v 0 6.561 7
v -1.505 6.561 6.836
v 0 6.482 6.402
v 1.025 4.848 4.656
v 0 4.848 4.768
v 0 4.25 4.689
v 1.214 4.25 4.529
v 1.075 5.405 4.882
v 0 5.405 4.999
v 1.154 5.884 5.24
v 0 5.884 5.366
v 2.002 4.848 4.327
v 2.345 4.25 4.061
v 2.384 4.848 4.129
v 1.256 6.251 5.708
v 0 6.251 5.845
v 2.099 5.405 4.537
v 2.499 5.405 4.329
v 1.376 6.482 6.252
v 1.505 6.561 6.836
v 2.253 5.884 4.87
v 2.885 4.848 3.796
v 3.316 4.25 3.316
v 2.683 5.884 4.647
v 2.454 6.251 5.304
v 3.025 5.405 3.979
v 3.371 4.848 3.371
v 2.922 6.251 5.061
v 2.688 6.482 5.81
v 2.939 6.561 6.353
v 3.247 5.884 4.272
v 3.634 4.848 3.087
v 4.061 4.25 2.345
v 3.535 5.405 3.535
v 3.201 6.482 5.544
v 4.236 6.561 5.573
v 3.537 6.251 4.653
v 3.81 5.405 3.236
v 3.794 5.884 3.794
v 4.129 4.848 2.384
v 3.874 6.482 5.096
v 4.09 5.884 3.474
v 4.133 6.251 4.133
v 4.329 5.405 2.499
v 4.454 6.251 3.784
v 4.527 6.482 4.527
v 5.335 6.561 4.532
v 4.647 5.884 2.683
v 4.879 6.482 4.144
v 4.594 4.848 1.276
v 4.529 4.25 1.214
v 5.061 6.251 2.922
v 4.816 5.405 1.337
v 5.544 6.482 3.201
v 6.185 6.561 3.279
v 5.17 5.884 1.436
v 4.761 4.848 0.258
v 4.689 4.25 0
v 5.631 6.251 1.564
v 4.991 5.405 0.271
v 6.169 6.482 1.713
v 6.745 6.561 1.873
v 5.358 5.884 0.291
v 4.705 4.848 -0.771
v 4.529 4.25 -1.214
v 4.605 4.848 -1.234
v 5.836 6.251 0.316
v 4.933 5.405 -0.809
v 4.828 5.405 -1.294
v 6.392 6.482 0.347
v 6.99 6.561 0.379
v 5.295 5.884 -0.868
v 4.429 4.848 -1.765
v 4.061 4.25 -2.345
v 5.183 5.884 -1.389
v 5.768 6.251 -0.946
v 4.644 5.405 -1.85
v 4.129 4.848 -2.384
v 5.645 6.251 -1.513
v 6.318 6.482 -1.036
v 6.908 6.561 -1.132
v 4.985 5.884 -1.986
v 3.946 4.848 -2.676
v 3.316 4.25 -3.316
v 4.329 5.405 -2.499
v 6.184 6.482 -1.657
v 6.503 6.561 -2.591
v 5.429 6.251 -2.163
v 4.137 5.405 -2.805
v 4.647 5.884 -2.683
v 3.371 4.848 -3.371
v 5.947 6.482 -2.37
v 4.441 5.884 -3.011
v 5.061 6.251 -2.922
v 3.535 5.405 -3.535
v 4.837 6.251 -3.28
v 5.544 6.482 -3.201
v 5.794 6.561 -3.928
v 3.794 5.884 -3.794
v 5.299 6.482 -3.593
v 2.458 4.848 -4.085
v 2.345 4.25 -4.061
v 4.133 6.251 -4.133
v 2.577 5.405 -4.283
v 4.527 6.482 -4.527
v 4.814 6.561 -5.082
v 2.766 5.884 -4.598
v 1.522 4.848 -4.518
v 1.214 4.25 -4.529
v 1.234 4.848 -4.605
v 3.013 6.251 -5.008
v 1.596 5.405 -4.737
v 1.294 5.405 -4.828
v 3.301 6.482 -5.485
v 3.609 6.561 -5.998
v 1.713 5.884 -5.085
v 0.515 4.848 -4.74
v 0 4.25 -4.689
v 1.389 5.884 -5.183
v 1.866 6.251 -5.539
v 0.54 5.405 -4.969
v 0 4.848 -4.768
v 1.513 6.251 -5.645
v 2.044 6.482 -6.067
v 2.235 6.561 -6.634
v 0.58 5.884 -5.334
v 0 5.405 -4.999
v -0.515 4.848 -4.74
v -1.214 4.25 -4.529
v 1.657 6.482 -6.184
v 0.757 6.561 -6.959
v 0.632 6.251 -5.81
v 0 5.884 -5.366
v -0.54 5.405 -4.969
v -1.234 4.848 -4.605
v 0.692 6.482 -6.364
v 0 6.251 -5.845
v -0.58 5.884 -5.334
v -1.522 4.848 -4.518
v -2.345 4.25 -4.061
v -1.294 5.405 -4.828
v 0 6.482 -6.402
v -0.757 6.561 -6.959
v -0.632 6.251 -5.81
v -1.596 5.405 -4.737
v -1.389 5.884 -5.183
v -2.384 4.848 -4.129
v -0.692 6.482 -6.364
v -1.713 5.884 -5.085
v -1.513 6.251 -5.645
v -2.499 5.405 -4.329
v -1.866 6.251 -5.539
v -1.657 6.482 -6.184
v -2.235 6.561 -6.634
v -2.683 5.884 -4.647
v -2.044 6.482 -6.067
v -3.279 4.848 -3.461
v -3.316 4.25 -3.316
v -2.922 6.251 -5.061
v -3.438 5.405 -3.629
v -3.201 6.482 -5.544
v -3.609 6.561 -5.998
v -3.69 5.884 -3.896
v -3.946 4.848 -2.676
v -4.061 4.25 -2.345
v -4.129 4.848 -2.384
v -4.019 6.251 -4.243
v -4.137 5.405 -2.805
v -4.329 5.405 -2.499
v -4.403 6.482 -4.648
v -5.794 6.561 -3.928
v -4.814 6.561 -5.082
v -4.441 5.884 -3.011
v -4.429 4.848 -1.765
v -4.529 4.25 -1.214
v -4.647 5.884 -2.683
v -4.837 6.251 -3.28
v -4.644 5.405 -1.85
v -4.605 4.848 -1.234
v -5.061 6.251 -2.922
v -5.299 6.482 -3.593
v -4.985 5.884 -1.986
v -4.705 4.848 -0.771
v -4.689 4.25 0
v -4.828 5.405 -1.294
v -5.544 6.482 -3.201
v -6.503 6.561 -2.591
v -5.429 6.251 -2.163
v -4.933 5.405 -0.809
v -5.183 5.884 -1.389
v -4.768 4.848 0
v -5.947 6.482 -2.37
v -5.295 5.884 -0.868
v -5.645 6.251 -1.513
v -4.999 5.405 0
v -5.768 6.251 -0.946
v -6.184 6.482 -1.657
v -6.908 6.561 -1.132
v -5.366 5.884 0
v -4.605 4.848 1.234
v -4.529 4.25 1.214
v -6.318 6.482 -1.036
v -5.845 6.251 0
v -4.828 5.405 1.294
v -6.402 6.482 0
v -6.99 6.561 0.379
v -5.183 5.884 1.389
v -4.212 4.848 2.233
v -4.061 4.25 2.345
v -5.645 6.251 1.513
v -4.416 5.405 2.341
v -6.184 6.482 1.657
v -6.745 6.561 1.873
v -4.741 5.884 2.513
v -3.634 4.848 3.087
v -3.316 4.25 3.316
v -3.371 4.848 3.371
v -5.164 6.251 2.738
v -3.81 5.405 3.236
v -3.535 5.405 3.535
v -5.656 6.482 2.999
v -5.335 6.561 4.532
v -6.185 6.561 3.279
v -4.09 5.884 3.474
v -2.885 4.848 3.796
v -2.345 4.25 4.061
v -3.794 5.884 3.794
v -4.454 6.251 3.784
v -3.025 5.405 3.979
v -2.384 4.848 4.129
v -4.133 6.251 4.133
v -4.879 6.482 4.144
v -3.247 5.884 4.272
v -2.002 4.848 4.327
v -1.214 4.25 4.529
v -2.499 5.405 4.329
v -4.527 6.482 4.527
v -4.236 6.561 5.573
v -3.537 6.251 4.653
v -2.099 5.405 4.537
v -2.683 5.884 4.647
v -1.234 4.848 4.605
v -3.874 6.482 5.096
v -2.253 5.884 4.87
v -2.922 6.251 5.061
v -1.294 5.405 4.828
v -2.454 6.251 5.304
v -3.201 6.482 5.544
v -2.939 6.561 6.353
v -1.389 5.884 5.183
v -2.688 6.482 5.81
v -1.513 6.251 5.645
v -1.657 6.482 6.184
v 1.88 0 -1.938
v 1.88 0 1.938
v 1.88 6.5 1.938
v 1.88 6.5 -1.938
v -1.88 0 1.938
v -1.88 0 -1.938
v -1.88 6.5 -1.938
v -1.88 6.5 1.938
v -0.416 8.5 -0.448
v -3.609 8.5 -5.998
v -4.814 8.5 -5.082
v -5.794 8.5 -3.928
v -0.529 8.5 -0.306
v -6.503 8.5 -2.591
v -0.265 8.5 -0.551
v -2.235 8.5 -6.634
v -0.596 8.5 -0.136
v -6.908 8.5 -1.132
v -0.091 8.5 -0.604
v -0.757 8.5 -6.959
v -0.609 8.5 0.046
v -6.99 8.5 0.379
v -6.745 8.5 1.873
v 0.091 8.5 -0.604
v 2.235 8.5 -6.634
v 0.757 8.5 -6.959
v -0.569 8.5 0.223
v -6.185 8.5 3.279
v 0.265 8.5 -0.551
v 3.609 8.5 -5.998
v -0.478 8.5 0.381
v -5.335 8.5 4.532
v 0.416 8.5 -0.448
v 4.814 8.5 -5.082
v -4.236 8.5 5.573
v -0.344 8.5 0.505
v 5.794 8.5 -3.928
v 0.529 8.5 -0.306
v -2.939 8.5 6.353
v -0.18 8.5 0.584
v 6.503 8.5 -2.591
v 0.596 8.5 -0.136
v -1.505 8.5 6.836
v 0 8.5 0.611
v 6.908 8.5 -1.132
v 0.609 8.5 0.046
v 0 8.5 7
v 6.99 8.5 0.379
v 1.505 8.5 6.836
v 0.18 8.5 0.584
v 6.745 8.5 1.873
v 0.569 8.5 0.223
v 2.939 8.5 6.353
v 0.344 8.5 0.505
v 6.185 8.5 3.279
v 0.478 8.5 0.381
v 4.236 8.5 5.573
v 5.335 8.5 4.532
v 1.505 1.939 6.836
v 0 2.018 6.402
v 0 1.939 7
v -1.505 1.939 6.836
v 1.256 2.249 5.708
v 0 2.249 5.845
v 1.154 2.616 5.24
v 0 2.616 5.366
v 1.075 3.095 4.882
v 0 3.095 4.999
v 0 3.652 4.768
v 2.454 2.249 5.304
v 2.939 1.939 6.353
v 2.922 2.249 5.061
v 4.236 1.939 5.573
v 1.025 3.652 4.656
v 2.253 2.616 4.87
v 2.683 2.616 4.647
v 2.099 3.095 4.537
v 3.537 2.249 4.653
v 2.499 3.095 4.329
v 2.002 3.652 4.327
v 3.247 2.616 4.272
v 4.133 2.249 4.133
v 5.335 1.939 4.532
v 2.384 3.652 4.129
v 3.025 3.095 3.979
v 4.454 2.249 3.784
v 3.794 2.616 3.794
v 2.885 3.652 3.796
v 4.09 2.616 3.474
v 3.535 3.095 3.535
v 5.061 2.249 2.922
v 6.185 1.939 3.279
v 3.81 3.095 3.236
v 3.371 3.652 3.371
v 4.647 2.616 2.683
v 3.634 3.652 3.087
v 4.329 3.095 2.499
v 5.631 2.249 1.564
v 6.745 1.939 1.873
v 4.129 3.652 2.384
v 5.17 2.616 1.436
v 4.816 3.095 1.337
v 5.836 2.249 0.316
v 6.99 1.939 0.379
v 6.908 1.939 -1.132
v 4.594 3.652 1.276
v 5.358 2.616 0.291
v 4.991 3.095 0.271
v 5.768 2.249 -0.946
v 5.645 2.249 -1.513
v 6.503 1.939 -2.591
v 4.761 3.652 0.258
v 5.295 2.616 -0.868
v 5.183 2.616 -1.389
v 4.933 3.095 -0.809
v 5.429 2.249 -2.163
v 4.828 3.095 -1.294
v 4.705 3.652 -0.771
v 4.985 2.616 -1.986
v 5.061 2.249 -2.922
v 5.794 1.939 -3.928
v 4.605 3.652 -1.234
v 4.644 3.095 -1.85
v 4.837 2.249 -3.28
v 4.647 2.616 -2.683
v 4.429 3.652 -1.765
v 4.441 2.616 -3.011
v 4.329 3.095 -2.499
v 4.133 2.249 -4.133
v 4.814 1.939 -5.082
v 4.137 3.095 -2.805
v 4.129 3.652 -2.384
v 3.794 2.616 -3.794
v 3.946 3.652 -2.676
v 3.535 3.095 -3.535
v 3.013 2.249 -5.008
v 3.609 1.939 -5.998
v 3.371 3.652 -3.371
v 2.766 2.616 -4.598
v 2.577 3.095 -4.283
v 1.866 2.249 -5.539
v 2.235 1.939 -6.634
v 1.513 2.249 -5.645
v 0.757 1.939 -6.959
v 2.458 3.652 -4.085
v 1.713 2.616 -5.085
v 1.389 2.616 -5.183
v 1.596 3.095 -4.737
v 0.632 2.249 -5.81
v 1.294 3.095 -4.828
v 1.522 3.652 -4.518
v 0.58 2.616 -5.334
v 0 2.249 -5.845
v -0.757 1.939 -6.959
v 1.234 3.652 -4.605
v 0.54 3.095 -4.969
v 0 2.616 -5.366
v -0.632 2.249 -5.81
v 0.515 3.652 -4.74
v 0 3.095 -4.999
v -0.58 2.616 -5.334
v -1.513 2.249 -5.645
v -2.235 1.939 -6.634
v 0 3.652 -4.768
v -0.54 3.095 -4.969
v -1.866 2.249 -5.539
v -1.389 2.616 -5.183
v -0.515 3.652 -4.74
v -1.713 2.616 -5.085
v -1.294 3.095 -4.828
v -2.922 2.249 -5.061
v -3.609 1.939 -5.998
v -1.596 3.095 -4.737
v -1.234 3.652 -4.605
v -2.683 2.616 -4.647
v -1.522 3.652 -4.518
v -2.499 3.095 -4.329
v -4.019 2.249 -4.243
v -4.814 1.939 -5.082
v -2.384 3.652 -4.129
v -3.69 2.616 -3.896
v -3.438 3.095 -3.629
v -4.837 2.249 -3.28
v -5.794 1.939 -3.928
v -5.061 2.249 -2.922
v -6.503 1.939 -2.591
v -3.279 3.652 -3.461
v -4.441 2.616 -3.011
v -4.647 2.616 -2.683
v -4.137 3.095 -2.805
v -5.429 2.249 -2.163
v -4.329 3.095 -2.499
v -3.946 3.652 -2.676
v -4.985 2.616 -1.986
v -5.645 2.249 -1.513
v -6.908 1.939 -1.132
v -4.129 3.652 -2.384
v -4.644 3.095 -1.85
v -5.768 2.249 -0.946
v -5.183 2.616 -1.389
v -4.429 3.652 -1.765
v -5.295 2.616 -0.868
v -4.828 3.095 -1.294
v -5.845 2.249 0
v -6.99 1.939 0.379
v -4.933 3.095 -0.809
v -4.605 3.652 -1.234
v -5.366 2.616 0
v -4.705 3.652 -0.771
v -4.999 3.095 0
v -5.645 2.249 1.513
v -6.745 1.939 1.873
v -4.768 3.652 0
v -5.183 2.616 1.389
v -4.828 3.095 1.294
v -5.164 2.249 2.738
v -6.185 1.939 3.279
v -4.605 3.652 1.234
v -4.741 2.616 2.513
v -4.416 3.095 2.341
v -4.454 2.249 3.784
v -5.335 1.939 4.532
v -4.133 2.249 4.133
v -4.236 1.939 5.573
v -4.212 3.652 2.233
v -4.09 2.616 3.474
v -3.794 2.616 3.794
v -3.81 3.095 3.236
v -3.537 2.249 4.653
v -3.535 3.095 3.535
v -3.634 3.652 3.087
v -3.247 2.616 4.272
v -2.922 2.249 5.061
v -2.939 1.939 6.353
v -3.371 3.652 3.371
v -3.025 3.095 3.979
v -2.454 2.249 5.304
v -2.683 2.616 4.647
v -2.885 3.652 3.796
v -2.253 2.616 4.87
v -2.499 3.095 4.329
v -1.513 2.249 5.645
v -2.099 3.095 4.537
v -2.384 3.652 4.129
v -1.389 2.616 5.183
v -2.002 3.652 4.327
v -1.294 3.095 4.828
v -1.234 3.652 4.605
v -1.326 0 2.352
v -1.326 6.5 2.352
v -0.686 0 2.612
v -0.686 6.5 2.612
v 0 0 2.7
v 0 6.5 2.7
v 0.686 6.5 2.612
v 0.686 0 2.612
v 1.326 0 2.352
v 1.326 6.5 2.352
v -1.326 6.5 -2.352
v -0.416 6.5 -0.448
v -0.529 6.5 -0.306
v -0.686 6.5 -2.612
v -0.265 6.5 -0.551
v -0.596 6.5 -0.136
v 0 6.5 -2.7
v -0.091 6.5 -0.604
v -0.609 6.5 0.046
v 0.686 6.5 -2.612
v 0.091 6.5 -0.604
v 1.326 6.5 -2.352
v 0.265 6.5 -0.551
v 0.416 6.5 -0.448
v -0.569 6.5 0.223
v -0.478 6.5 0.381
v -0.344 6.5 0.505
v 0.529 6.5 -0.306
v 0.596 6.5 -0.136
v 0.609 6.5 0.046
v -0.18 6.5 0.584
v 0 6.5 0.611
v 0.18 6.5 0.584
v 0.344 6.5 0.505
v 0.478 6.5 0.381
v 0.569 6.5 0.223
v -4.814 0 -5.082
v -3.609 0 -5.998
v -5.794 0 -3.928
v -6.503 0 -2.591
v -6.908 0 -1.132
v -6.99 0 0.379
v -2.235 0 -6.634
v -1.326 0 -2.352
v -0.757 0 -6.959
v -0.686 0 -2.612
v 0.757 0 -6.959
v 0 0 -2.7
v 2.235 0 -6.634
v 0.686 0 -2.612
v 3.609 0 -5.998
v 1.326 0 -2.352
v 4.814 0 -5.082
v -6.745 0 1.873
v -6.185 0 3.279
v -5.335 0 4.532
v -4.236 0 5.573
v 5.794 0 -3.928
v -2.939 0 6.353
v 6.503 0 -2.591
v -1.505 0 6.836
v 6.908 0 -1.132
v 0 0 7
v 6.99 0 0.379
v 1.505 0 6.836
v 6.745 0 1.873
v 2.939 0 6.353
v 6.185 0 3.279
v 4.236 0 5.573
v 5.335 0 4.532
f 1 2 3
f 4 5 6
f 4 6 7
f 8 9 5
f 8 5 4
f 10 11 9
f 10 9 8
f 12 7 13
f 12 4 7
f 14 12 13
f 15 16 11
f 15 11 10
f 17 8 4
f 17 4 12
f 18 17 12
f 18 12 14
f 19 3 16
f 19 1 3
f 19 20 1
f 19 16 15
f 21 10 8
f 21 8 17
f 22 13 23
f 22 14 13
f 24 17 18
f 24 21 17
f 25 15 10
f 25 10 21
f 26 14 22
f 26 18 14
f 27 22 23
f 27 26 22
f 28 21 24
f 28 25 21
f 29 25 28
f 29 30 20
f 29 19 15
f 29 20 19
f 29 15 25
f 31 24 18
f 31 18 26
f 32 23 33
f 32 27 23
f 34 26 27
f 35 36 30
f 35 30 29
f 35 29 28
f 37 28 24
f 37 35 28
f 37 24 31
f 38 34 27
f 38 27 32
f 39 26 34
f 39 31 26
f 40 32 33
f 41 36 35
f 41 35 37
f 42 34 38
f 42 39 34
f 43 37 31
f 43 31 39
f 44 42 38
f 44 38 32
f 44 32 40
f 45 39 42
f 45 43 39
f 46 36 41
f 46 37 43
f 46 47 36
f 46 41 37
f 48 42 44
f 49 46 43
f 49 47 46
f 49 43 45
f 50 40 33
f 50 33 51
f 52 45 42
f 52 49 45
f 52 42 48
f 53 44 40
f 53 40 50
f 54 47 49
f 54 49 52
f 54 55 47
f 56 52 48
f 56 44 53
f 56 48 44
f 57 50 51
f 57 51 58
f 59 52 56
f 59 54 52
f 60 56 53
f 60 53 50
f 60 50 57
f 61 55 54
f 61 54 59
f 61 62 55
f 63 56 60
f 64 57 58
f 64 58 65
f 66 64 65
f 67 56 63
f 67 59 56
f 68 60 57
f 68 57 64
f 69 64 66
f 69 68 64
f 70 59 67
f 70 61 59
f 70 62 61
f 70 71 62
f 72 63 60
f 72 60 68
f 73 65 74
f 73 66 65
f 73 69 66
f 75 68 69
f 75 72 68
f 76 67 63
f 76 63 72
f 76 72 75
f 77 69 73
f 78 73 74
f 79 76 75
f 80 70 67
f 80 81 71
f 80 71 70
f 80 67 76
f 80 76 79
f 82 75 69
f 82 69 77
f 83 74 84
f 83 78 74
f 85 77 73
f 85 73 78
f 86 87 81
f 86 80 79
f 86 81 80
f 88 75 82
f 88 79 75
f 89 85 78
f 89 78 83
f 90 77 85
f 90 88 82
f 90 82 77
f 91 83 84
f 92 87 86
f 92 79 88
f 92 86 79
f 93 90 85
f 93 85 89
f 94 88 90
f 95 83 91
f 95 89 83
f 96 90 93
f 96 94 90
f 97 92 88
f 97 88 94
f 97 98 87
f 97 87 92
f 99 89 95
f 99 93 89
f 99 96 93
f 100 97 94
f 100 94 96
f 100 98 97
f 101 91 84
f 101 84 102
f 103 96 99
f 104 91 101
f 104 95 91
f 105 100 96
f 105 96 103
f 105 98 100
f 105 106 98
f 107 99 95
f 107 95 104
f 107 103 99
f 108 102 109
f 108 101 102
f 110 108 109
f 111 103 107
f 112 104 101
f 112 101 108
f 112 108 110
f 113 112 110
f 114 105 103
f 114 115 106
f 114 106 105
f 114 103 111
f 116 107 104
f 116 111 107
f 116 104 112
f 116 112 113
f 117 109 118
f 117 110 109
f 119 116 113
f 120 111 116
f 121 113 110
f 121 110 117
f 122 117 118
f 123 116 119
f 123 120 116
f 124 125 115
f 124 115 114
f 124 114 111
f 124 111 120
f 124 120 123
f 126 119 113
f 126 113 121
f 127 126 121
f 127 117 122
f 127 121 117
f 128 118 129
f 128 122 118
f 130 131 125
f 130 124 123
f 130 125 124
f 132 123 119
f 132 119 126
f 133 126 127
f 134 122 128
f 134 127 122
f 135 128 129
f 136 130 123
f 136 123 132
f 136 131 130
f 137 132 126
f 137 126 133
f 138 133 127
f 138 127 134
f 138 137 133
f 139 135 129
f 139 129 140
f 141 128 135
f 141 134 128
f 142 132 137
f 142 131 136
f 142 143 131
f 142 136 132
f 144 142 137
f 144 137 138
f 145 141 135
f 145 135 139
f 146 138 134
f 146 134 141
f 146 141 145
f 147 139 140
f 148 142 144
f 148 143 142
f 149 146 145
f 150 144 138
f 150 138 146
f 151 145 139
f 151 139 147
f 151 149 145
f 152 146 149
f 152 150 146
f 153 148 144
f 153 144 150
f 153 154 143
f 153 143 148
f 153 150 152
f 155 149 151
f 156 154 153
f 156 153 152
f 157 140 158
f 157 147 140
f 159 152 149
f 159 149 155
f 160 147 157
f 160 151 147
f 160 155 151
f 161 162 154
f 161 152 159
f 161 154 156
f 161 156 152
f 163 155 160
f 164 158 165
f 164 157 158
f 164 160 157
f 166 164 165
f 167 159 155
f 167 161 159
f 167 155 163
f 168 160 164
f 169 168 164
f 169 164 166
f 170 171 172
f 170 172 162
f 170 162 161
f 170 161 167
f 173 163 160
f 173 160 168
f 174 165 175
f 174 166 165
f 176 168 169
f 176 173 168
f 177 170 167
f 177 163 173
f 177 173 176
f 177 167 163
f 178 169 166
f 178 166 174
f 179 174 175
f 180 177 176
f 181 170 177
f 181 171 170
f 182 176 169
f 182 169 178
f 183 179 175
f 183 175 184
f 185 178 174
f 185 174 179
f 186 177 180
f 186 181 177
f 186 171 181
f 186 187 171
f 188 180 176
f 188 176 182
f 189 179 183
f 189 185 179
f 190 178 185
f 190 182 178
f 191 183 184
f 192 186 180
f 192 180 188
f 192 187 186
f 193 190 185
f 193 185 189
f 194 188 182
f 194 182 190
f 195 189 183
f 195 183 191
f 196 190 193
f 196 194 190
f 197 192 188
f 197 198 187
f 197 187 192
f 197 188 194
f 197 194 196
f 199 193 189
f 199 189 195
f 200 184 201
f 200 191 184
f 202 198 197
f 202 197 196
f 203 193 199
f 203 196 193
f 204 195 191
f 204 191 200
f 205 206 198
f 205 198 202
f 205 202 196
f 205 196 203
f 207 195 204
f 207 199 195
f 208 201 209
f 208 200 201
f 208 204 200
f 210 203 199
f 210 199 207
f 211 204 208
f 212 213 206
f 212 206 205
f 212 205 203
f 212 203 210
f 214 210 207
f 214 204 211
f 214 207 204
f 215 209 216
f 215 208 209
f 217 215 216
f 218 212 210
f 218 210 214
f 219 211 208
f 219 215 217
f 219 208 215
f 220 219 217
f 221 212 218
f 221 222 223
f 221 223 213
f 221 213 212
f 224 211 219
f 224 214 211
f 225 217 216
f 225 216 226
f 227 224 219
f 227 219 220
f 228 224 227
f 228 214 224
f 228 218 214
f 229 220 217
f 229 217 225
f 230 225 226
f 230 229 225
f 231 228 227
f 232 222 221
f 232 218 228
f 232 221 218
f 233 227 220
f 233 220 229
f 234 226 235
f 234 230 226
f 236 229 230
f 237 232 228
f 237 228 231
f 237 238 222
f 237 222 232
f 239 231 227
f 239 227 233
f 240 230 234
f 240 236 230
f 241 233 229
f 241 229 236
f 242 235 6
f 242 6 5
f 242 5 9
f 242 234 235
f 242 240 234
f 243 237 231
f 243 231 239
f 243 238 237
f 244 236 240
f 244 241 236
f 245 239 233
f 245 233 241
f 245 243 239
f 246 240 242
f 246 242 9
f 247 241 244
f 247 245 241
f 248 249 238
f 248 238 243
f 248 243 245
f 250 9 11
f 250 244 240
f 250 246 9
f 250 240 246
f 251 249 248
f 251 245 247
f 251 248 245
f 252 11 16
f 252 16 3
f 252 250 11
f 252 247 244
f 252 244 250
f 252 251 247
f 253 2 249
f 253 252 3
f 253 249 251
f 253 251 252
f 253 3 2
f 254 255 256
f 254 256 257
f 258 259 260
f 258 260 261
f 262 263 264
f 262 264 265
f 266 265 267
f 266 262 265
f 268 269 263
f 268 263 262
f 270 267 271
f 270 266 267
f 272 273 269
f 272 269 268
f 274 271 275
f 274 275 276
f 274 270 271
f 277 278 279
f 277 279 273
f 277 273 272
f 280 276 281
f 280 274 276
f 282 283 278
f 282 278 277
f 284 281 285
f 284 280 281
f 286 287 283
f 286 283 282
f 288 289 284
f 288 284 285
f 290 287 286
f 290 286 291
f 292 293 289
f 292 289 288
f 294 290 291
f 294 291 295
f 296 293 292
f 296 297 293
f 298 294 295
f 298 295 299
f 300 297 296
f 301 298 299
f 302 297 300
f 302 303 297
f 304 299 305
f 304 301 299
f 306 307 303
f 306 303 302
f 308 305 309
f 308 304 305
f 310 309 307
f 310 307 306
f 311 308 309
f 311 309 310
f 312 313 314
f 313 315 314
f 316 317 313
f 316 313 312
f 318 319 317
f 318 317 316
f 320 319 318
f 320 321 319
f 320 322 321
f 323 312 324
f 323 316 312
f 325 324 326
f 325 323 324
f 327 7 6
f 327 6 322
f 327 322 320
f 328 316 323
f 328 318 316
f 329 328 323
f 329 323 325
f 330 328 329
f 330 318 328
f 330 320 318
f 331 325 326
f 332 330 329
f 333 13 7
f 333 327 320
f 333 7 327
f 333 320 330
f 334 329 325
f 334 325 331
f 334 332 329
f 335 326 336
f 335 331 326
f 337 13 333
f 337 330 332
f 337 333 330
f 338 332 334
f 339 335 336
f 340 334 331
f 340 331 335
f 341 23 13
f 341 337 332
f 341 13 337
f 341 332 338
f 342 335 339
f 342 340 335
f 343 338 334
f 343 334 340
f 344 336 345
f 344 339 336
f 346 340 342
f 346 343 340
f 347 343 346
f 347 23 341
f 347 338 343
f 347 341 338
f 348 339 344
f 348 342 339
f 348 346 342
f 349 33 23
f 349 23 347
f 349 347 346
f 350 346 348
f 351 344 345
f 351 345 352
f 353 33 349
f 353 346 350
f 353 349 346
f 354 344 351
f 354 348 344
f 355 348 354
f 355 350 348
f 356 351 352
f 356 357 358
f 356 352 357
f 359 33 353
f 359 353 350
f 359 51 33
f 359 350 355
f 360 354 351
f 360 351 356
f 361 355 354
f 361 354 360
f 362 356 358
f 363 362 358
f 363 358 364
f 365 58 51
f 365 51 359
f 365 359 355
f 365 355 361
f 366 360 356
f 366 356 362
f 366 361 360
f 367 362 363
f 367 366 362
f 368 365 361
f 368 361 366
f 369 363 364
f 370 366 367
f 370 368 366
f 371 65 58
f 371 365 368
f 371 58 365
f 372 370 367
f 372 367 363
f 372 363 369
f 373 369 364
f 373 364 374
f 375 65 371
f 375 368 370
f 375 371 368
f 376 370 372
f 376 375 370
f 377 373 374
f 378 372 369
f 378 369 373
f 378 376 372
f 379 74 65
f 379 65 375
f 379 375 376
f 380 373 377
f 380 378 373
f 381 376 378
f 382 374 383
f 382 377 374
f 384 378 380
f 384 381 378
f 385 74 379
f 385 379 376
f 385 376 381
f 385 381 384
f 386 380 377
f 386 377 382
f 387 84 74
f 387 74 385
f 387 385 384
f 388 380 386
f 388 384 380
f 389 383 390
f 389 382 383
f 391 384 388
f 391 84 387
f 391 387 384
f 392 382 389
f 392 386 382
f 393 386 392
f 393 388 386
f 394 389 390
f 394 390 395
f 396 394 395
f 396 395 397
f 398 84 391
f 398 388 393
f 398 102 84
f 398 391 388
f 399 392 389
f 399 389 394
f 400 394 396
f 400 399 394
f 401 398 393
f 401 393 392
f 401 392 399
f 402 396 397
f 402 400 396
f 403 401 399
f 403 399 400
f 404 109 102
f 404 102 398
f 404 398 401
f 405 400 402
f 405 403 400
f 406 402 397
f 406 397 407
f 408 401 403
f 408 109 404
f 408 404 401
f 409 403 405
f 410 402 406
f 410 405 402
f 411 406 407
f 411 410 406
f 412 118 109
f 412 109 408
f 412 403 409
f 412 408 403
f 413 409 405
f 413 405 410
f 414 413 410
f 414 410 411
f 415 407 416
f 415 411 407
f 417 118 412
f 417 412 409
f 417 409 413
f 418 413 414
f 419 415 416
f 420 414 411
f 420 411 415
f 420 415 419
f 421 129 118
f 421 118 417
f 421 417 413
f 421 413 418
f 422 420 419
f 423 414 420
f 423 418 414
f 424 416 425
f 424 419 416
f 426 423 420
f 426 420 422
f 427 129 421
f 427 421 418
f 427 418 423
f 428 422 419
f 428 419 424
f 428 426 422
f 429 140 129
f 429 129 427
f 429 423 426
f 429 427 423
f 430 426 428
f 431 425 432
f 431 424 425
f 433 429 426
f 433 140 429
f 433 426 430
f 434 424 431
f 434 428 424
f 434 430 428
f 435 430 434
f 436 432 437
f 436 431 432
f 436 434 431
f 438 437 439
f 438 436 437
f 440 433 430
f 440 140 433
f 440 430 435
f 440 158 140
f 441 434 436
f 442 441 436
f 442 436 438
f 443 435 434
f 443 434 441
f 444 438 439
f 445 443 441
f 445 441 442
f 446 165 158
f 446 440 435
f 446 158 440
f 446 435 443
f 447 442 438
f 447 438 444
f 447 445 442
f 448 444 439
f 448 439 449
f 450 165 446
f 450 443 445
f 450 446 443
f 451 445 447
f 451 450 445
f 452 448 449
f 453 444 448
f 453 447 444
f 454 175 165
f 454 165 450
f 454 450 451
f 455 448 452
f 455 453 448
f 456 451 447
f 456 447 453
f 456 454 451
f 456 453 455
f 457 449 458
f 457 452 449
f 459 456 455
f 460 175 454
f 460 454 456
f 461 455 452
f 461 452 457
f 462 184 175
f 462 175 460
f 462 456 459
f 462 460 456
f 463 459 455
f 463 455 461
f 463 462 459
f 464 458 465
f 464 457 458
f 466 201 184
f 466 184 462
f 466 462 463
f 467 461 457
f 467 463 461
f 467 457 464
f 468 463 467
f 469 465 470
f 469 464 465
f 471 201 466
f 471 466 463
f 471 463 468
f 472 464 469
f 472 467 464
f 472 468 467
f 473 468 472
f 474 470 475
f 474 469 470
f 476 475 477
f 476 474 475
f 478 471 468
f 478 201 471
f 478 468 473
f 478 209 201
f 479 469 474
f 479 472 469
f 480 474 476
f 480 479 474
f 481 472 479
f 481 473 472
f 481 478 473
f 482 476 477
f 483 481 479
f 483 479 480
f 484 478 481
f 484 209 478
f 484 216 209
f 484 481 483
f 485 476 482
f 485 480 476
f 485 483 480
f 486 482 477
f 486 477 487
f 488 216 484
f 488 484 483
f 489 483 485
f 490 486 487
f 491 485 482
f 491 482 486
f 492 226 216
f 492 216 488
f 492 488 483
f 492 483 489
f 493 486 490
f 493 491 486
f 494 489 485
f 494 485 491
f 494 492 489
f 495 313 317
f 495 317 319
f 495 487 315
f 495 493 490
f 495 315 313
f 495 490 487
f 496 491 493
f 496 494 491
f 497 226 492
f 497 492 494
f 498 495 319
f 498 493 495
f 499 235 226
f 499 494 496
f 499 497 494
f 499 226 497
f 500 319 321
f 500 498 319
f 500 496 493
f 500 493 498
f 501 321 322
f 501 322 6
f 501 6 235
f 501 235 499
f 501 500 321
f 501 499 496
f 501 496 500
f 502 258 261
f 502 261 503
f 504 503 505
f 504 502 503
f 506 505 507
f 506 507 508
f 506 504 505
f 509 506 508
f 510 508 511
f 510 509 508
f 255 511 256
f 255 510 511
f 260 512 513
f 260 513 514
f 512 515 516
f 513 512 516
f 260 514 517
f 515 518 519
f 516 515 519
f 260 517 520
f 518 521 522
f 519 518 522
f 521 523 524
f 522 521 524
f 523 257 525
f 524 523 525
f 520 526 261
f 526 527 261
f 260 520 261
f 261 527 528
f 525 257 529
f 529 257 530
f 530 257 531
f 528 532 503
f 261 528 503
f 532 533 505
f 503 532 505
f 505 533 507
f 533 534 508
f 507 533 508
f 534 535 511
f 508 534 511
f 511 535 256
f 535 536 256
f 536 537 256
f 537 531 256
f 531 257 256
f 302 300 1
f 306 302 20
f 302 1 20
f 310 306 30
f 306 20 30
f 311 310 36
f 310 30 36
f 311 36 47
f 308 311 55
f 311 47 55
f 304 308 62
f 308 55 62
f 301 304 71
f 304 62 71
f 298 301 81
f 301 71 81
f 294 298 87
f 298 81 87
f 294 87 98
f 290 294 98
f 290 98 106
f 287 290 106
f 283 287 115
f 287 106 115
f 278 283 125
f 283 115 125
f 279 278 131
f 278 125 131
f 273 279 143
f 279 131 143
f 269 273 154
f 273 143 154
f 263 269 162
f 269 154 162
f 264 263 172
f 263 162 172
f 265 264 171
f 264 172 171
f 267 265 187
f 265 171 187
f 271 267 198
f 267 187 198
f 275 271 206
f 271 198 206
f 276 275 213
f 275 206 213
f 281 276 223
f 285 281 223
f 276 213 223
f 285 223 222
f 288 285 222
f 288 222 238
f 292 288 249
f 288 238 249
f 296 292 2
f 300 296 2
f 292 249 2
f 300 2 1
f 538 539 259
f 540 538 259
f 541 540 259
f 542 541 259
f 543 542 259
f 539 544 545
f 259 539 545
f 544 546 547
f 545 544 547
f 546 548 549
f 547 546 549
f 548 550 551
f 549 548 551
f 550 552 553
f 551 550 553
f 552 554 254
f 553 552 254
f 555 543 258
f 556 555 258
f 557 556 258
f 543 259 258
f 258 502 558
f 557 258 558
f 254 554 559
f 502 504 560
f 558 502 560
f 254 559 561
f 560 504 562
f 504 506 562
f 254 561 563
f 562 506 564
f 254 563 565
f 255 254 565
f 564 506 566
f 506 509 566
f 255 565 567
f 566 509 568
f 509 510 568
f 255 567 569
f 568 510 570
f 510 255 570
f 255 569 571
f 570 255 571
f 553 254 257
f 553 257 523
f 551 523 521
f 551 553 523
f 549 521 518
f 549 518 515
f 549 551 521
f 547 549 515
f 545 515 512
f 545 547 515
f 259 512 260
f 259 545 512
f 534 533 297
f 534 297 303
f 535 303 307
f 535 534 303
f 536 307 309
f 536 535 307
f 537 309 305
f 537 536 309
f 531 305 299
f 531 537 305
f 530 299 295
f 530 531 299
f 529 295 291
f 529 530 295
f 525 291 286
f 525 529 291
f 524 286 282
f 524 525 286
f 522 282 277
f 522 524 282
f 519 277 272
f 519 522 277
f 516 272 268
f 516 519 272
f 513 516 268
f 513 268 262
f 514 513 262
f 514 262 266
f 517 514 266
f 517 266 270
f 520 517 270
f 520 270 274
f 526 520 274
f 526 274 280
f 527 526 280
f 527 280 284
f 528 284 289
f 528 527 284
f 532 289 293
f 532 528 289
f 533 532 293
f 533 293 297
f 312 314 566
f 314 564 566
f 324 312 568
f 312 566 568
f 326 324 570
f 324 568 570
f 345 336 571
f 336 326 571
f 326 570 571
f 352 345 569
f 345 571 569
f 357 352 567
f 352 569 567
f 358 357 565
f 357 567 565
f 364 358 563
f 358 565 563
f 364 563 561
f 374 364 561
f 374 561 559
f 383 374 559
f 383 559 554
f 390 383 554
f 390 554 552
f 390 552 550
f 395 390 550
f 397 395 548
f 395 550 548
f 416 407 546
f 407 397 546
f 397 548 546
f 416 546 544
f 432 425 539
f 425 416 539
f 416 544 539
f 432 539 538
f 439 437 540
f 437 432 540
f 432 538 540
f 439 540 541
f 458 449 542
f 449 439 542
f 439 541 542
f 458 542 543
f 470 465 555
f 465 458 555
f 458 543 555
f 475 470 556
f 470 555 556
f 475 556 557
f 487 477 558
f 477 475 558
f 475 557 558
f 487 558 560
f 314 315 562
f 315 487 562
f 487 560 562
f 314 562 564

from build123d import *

# Parameters (mm, degrees)
SKETCH1_R           = 7
BOSS_EXTRUDE1_DEPTH = 6.5
SKETCH2_R           = 7
SKETCH2_R_2         = 0.611197666
BOSS_EXTRUDE2_DEPTH = 2
SKETCH3_R           = 2.310970428


with BuildPart() as part:
    # Sketch1 → Boss-Extrude1 (new body)
    with BuildSketch(Plane(origin=(0, 0, 0), x_dir=(1, 0, 0), z_dir=(0, 1, 0))):
        with Locations(Location((0, 0, 0), (0, 0, 270))):  # turned: the seam where the file's is
            Circle(SKETCH1_R)
        with BuildLine():
            Line((-1.88, 1.937937047), (-1.88, -1.937937047))
            ThreePointArc((-1.88, -1.937937047), (0, -2.7), (1.88, -1.937937047))
            Line((1.88, -1.937937047), (1.88, 1.937937047))
            ThreePointArc((1.88, 1.937937047), (0, 2.7), (-1.88, 1.937937047))
        make_face(mode=Mode.SUBTRACT)
    extrude(amount=BOSS_EXTRUDE1_DEPTH)

    # Sketch2 → Boss-Extrude2 (add)
    with BuildSketch(Plane(origin=(0, 6.5, 0), x_dir=(1, 0, 0), z_dir=(0, 1, 0))):
        with Locations(Location((0, 0, 0), (0, 0, 270))):  # turned: the seam where the file's is
            Circle(SKETCH2_R)
        with Locations(Location((0, 0, 0), (0, 0, 270))):  # turned: the seam where the file's is
            Circle(SKETCH2_R_2, mode=Mode.SUBTRACT)
    extrude(amount=BOSS_EXTRUDE2_DEPTH)

    # Sketch3 → Cut-Revolve1 (revolve, cut)
    with BuildSketch(Plane(origin=(0, 0, 0), x_dir=(0, 0, -1), z_dir=(1, 0, 0))):
        with Locations((-7, 4.25)):
            Circle(SKETCH3_R)
    revolve(axis=Axis((0, 0, 0), (0, 1, 0)), mode=Mode.SUBTRACT)


solid = part.part
